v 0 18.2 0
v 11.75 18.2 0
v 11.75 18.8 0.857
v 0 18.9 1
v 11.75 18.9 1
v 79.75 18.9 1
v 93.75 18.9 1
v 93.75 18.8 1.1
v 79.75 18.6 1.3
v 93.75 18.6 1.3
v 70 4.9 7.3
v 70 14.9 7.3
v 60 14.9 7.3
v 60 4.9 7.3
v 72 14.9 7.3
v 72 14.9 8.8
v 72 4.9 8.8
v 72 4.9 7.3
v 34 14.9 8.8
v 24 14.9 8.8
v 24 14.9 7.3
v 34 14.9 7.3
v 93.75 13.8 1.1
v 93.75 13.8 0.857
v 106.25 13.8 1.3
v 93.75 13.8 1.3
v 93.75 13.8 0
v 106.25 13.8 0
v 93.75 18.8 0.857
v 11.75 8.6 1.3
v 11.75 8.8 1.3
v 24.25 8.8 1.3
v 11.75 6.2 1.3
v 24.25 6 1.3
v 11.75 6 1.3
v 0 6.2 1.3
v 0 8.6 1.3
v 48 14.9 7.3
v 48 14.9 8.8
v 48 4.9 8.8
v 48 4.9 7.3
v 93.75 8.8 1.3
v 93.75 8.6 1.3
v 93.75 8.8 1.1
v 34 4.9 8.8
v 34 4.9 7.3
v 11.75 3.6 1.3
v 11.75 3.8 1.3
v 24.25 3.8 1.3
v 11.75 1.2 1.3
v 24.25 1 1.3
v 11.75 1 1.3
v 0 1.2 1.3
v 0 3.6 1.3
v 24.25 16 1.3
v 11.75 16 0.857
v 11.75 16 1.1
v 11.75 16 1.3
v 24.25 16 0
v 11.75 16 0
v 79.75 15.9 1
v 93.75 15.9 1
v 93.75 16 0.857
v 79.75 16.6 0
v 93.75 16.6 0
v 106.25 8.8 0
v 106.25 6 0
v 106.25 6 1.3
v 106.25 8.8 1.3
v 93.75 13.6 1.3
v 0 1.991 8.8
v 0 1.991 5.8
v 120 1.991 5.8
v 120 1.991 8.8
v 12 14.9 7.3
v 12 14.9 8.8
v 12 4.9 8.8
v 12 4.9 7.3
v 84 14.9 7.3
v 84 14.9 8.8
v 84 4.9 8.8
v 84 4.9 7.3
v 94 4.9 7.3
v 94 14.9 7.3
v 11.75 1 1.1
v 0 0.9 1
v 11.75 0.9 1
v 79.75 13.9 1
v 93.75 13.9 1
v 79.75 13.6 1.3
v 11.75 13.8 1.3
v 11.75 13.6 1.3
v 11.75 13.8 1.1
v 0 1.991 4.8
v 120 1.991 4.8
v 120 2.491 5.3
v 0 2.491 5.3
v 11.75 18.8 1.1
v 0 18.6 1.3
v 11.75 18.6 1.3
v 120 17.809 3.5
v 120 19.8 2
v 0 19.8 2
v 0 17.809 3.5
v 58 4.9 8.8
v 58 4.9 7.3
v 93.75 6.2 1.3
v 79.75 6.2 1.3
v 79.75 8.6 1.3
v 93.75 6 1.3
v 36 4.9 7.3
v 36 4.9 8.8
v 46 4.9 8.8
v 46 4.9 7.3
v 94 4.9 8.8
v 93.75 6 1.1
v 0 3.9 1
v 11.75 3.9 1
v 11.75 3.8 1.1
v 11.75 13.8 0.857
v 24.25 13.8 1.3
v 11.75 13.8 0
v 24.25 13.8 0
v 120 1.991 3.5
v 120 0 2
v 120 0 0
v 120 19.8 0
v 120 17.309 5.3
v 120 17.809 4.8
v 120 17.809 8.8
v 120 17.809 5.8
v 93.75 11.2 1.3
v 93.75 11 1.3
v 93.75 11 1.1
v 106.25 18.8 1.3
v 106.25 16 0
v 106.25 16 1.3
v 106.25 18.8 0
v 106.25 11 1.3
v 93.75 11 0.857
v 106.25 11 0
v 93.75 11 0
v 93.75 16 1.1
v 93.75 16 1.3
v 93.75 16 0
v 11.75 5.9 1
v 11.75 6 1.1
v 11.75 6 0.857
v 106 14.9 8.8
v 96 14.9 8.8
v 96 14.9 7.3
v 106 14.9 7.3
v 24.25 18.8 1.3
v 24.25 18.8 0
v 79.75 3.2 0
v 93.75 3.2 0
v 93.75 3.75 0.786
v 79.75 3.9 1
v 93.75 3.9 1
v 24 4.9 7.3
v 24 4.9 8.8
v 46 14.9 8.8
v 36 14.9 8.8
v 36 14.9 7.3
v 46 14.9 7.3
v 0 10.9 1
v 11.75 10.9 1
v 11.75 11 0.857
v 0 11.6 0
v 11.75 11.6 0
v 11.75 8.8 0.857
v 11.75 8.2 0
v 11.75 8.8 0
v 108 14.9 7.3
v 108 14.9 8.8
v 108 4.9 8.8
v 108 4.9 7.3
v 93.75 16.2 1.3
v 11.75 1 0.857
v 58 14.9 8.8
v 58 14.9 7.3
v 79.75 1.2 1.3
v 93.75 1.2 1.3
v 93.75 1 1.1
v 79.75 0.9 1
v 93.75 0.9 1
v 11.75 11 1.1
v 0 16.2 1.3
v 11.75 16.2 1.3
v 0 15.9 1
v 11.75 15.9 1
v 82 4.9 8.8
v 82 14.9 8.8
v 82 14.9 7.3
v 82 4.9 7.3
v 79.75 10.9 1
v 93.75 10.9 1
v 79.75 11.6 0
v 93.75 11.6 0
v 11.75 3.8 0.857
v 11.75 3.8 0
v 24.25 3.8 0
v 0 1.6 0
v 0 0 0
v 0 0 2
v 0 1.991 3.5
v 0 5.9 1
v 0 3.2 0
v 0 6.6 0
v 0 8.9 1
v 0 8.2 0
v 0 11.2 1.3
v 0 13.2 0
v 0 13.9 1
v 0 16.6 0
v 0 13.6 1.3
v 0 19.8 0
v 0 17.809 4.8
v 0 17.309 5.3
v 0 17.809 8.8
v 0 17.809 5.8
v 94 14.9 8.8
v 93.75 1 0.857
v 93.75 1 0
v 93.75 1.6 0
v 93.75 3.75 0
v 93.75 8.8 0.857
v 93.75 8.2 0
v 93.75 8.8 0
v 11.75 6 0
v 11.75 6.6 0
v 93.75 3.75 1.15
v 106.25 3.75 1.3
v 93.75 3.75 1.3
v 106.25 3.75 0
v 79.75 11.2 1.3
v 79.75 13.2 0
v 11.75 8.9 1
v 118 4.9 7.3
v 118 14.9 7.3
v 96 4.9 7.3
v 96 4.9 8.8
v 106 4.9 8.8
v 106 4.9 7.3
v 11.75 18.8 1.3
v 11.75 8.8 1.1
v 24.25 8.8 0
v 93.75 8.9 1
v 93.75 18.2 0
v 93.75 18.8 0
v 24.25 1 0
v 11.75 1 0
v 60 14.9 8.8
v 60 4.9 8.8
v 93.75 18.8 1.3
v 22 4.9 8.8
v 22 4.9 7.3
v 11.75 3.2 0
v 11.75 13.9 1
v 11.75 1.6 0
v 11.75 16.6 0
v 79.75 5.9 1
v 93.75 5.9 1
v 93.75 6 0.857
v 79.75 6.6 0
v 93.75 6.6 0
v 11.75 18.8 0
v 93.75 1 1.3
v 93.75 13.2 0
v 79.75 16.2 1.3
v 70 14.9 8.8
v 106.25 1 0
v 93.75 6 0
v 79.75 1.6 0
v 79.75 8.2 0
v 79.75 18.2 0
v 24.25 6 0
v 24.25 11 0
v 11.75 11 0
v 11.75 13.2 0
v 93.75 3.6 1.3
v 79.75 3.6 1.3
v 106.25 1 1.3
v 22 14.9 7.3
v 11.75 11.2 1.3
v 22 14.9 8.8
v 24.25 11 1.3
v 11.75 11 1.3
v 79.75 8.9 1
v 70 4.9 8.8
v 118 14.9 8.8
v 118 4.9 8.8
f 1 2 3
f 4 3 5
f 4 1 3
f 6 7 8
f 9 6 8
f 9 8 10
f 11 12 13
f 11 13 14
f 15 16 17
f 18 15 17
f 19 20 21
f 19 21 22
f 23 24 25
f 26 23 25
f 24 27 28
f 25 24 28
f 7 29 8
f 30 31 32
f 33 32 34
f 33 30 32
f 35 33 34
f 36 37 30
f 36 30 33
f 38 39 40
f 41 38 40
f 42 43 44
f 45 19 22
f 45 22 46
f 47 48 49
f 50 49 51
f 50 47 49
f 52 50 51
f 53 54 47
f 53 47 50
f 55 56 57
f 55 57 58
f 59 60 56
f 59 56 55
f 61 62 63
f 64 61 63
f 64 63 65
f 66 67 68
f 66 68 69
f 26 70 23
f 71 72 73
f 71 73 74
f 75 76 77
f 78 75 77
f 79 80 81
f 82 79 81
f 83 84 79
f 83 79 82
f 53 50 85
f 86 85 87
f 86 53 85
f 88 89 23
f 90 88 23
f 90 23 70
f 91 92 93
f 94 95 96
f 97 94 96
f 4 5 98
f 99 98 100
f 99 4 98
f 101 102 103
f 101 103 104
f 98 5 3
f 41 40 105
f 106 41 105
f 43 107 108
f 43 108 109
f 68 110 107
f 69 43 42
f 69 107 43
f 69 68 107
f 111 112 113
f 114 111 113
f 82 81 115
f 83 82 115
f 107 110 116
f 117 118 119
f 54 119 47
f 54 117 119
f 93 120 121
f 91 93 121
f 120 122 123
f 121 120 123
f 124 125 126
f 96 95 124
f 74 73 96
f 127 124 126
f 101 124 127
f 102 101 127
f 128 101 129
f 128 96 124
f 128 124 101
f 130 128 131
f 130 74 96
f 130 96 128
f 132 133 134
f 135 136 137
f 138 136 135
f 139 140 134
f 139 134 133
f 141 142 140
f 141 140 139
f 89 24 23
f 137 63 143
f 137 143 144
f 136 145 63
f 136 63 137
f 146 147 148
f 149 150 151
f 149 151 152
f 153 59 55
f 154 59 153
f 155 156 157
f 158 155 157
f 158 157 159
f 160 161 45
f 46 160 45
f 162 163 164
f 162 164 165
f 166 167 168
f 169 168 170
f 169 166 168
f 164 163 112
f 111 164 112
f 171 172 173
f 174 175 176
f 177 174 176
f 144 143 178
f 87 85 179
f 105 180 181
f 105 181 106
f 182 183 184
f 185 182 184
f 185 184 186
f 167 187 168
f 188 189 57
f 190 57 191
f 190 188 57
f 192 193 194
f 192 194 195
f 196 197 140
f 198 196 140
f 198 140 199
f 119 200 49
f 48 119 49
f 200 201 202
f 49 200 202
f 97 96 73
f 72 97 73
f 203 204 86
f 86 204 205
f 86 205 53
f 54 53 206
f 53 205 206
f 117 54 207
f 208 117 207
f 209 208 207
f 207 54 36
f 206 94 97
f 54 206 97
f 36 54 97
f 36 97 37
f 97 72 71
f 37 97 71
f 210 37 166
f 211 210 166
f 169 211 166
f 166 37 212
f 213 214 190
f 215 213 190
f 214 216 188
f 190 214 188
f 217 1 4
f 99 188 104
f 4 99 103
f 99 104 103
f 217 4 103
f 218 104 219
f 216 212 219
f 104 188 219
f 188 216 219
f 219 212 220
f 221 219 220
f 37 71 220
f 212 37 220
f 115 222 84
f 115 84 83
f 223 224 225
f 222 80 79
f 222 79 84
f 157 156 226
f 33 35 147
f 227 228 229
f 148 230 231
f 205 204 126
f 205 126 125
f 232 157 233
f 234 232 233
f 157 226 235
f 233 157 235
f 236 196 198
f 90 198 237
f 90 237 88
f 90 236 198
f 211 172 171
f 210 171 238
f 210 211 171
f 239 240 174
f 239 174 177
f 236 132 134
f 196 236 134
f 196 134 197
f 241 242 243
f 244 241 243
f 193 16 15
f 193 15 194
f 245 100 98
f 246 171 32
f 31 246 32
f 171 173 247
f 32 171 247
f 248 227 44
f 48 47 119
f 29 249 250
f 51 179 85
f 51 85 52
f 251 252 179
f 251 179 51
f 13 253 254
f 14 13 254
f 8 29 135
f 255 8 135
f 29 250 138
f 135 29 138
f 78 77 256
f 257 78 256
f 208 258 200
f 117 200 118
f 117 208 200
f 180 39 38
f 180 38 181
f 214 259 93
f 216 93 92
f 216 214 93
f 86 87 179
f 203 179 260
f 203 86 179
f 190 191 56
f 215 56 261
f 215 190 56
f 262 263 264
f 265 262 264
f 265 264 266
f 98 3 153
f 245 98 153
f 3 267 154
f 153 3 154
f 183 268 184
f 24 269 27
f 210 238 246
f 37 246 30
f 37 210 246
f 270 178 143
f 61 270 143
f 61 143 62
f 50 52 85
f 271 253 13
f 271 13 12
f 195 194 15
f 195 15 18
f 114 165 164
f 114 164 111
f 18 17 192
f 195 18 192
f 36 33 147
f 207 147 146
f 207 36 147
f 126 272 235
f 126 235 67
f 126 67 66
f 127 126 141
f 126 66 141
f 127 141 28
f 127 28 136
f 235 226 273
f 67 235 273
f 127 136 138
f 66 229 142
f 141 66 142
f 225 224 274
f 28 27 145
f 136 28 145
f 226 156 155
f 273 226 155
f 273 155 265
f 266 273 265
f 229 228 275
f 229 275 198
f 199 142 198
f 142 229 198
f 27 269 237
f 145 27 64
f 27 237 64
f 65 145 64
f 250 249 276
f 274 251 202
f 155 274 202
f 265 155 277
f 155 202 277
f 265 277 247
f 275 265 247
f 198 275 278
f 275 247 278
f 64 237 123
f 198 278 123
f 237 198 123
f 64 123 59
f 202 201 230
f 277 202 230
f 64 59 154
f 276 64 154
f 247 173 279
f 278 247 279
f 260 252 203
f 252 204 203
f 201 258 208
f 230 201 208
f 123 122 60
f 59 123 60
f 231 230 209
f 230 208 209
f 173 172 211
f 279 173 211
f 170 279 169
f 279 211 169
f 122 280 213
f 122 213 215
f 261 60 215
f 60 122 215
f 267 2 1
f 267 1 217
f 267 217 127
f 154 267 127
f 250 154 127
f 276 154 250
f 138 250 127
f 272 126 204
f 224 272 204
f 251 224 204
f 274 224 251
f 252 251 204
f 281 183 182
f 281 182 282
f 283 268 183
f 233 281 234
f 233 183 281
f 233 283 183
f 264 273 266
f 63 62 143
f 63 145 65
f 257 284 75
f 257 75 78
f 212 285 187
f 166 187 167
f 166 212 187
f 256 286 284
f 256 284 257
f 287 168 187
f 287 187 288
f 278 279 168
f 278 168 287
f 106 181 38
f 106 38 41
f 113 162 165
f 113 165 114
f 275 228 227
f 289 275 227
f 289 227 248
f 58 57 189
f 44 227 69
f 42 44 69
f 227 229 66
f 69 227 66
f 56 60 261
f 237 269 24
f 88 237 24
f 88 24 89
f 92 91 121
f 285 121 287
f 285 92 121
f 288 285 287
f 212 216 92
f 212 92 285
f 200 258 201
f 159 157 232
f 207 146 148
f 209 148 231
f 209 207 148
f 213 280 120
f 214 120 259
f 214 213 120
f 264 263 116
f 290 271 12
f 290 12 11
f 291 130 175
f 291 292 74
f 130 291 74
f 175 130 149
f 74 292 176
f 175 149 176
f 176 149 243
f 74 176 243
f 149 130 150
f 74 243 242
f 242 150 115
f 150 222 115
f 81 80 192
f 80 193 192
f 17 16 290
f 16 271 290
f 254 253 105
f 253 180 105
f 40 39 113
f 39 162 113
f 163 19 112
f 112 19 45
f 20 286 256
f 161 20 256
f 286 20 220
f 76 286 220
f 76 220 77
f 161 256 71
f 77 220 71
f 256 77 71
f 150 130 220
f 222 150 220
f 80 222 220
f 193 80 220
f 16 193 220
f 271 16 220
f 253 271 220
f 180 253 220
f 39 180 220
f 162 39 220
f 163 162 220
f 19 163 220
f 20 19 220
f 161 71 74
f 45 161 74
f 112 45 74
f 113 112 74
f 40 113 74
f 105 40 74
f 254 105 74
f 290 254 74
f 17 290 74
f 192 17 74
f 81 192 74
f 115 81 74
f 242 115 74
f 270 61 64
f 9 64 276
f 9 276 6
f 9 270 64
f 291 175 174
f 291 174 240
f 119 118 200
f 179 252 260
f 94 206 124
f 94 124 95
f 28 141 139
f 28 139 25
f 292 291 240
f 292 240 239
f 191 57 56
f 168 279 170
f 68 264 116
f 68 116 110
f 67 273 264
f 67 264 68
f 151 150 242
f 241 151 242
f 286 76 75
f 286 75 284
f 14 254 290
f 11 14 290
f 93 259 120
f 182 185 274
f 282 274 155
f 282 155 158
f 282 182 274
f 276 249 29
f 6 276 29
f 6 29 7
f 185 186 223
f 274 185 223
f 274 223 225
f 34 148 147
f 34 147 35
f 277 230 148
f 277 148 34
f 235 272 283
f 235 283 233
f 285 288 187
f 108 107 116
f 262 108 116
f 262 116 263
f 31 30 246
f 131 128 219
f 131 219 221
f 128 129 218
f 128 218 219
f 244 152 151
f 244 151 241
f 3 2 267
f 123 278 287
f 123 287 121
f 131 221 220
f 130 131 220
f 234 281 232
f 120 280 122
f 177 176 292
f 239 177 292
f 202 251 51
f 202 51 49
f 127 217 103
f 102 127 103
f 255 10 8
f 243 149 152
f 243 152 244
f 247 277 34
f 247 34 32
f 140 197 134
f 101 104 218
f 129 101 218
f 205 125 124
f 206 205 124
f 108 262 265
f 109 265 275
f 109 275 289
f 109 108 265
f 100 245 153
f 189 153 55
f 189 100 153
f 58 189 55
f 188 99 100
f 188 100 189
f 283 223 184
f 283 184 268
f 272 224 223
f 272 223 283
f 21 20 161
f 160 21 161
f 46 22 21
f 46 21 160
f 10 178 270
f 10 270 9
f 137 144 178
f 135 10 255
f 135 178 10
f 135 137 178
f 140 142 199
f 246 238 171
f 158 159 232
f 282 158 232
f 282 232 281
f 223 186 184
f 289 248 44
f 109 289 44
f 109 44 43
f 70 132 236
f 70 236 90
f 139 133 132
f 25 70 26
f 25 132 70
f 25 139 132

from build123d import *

# Parameters (mm, degrees)
PAD_DEPTH              = 120
SKETCH001_W            = 2.8
SKETCH001_H            = 12.5
SKETCH001_W_2          = 2.75
POCKET_DEPTH           = 1.3
POCKET001_DEPTH        = 11.75
POCKET004_DEPTH        = 14
LINEARPATTERN001_COUNT = 4
LINEARPATTERN001_PITCH = 5
LINEARPATTERN_COUNT    = 4
LINEARPATTERN_PITCH    = 5
SKETCH011_W            = 10
SKETCH011_H            = 10
POCKET005_DEPTH        = 1.5
LINEARPATTERN002_COUNT = 9
LINEARPATTERN002_PITCH = 12


with BuildPart() as part:
    # Sketch → Pad (new body)
    with BuildSketch(Plane.YZ):
        Polygon((0, 0), (0, 2), (1.990567, 3.5), (1.990567, 4.8), (2.490567, 5.3), (1.990567, 5.8), (1.990567, 8.8), (9.9, 8.8), (9.9, 0), align=None)
    extrude(amount=PAD_DEPTH)

    # Mirrored: part across face of Pad


with BuildPart() as part_1:
    add(part.part)
    add(part.part.mirror(Plane(origin=(60, 9.9, 4.4), x_dir=(-1, 0, 0), z_dir=(0, 1, 0))))

    # Sketch001 (on Face7 of Mirrored) → Pocket (cut)
    with BuildSketch(Plane.YX):
        with Locations((2.4, 18)):
            Rectangle(SKETCH001_W, SKETCH001_H)
        with Locations((7.4, 18)):
            Rectangle(SKETCH001_W, SKETCH001_H)
        with Locations((12.4, 18)):
            Rectangle(SKETCH001_W, SKETCH001_H)
        with Locations((2.375, 100)):
            Rectangle(SKETCH001_W_2, SKETCH001_H)
        with Locations((7.4, 100)):
            Rectangle(SKETCH001_W, SKETCH001_H)
        with Locations((12.4, 100)):
            Rectangle(SKETCH001_W, SKETCH001_H)
        with Locations((17.4, 18)):
            Rectangle(SKETCH001_W, SKETCH001_H)
        with Locations((17.4, 100)):
            Rectangle(SKETCH001_W, SKETCH001_H)
    extrude(amount=-POCKET_DEPTH, mode=Mode.SUBTRACT)

    # Sketch002 (on Face4 of Pocket) → Pocket001 (cut)
    with BuildSketch(Plane(origin=(0, 0, 0), x_dir=(0, 1, 0), z_dir=(-1, 0, 0))):
        Polygon((18.2, 0), (18.9, -1), (18.6, -1.3), (16.2, -1.3), (15.9, -1), (16.6, 0), align=None)
    pocket001 = extrude(amount=-POCKET001_DEPTH, mode=Mode.SUBTRACT)

    # Sketch010 (on Face14 of Pocket001) → Pocket004 (cut)
    with BuildSketch(Plane.YZ.offset(93.75)):
        Polygon((15.9, 1), (16.6, 0), (18.2, 0), (18.9, 1), (18.6, 1.3), (16.2, 1.3), align=None)
    pocket004 = extrude(amount=-POCKET004_DEPTH, mode=Mode.SUBTRACT)

    # LinearPattern001: Pocket004 ×4
    with Locations(*[(0, -i * LINEARPATTERN001_PITCH, 0) for i in range(1, LINEARPATTERN001_COUNT)]):
        add(pocket004, mode=Mode.SUBTRACT)

    # LinearPattern: Pocket001 ×4
    with Locations(*[(0, -i * LINEARPATTERN_PITCH, 0) for i in range(1, LINEARPATTERN_COUNT)]):
        add(pocket001, mode=Mode.SUBTRACT)

    # Sketch011 (on Face82 of LinearPattern) → Pocket005 (cut)
    with BuildSketch(Plane(origin=(0, 0, 8.8), x_dir=(0, -1, 0), z_dir=(0, 0, 1))):
        with Locations((-9.9, 113)):
            Rectangle(SKETCH011_W, SKETCH011_H)
    pocket005 = extrude(amount=-POCKET005_DEPTH, mode=Mode.SUBTRACT)

    # LinearPattern002: Pocket005 ×9
    with Locations(*[(-i * LINEARPATTERN002_PITCH, 0, 0) for i in range(1, LINEARPATTERN002_COUNT)]):
        add(pocket005, mode=Mode.SUBTRACT)


solid = part_1.part
